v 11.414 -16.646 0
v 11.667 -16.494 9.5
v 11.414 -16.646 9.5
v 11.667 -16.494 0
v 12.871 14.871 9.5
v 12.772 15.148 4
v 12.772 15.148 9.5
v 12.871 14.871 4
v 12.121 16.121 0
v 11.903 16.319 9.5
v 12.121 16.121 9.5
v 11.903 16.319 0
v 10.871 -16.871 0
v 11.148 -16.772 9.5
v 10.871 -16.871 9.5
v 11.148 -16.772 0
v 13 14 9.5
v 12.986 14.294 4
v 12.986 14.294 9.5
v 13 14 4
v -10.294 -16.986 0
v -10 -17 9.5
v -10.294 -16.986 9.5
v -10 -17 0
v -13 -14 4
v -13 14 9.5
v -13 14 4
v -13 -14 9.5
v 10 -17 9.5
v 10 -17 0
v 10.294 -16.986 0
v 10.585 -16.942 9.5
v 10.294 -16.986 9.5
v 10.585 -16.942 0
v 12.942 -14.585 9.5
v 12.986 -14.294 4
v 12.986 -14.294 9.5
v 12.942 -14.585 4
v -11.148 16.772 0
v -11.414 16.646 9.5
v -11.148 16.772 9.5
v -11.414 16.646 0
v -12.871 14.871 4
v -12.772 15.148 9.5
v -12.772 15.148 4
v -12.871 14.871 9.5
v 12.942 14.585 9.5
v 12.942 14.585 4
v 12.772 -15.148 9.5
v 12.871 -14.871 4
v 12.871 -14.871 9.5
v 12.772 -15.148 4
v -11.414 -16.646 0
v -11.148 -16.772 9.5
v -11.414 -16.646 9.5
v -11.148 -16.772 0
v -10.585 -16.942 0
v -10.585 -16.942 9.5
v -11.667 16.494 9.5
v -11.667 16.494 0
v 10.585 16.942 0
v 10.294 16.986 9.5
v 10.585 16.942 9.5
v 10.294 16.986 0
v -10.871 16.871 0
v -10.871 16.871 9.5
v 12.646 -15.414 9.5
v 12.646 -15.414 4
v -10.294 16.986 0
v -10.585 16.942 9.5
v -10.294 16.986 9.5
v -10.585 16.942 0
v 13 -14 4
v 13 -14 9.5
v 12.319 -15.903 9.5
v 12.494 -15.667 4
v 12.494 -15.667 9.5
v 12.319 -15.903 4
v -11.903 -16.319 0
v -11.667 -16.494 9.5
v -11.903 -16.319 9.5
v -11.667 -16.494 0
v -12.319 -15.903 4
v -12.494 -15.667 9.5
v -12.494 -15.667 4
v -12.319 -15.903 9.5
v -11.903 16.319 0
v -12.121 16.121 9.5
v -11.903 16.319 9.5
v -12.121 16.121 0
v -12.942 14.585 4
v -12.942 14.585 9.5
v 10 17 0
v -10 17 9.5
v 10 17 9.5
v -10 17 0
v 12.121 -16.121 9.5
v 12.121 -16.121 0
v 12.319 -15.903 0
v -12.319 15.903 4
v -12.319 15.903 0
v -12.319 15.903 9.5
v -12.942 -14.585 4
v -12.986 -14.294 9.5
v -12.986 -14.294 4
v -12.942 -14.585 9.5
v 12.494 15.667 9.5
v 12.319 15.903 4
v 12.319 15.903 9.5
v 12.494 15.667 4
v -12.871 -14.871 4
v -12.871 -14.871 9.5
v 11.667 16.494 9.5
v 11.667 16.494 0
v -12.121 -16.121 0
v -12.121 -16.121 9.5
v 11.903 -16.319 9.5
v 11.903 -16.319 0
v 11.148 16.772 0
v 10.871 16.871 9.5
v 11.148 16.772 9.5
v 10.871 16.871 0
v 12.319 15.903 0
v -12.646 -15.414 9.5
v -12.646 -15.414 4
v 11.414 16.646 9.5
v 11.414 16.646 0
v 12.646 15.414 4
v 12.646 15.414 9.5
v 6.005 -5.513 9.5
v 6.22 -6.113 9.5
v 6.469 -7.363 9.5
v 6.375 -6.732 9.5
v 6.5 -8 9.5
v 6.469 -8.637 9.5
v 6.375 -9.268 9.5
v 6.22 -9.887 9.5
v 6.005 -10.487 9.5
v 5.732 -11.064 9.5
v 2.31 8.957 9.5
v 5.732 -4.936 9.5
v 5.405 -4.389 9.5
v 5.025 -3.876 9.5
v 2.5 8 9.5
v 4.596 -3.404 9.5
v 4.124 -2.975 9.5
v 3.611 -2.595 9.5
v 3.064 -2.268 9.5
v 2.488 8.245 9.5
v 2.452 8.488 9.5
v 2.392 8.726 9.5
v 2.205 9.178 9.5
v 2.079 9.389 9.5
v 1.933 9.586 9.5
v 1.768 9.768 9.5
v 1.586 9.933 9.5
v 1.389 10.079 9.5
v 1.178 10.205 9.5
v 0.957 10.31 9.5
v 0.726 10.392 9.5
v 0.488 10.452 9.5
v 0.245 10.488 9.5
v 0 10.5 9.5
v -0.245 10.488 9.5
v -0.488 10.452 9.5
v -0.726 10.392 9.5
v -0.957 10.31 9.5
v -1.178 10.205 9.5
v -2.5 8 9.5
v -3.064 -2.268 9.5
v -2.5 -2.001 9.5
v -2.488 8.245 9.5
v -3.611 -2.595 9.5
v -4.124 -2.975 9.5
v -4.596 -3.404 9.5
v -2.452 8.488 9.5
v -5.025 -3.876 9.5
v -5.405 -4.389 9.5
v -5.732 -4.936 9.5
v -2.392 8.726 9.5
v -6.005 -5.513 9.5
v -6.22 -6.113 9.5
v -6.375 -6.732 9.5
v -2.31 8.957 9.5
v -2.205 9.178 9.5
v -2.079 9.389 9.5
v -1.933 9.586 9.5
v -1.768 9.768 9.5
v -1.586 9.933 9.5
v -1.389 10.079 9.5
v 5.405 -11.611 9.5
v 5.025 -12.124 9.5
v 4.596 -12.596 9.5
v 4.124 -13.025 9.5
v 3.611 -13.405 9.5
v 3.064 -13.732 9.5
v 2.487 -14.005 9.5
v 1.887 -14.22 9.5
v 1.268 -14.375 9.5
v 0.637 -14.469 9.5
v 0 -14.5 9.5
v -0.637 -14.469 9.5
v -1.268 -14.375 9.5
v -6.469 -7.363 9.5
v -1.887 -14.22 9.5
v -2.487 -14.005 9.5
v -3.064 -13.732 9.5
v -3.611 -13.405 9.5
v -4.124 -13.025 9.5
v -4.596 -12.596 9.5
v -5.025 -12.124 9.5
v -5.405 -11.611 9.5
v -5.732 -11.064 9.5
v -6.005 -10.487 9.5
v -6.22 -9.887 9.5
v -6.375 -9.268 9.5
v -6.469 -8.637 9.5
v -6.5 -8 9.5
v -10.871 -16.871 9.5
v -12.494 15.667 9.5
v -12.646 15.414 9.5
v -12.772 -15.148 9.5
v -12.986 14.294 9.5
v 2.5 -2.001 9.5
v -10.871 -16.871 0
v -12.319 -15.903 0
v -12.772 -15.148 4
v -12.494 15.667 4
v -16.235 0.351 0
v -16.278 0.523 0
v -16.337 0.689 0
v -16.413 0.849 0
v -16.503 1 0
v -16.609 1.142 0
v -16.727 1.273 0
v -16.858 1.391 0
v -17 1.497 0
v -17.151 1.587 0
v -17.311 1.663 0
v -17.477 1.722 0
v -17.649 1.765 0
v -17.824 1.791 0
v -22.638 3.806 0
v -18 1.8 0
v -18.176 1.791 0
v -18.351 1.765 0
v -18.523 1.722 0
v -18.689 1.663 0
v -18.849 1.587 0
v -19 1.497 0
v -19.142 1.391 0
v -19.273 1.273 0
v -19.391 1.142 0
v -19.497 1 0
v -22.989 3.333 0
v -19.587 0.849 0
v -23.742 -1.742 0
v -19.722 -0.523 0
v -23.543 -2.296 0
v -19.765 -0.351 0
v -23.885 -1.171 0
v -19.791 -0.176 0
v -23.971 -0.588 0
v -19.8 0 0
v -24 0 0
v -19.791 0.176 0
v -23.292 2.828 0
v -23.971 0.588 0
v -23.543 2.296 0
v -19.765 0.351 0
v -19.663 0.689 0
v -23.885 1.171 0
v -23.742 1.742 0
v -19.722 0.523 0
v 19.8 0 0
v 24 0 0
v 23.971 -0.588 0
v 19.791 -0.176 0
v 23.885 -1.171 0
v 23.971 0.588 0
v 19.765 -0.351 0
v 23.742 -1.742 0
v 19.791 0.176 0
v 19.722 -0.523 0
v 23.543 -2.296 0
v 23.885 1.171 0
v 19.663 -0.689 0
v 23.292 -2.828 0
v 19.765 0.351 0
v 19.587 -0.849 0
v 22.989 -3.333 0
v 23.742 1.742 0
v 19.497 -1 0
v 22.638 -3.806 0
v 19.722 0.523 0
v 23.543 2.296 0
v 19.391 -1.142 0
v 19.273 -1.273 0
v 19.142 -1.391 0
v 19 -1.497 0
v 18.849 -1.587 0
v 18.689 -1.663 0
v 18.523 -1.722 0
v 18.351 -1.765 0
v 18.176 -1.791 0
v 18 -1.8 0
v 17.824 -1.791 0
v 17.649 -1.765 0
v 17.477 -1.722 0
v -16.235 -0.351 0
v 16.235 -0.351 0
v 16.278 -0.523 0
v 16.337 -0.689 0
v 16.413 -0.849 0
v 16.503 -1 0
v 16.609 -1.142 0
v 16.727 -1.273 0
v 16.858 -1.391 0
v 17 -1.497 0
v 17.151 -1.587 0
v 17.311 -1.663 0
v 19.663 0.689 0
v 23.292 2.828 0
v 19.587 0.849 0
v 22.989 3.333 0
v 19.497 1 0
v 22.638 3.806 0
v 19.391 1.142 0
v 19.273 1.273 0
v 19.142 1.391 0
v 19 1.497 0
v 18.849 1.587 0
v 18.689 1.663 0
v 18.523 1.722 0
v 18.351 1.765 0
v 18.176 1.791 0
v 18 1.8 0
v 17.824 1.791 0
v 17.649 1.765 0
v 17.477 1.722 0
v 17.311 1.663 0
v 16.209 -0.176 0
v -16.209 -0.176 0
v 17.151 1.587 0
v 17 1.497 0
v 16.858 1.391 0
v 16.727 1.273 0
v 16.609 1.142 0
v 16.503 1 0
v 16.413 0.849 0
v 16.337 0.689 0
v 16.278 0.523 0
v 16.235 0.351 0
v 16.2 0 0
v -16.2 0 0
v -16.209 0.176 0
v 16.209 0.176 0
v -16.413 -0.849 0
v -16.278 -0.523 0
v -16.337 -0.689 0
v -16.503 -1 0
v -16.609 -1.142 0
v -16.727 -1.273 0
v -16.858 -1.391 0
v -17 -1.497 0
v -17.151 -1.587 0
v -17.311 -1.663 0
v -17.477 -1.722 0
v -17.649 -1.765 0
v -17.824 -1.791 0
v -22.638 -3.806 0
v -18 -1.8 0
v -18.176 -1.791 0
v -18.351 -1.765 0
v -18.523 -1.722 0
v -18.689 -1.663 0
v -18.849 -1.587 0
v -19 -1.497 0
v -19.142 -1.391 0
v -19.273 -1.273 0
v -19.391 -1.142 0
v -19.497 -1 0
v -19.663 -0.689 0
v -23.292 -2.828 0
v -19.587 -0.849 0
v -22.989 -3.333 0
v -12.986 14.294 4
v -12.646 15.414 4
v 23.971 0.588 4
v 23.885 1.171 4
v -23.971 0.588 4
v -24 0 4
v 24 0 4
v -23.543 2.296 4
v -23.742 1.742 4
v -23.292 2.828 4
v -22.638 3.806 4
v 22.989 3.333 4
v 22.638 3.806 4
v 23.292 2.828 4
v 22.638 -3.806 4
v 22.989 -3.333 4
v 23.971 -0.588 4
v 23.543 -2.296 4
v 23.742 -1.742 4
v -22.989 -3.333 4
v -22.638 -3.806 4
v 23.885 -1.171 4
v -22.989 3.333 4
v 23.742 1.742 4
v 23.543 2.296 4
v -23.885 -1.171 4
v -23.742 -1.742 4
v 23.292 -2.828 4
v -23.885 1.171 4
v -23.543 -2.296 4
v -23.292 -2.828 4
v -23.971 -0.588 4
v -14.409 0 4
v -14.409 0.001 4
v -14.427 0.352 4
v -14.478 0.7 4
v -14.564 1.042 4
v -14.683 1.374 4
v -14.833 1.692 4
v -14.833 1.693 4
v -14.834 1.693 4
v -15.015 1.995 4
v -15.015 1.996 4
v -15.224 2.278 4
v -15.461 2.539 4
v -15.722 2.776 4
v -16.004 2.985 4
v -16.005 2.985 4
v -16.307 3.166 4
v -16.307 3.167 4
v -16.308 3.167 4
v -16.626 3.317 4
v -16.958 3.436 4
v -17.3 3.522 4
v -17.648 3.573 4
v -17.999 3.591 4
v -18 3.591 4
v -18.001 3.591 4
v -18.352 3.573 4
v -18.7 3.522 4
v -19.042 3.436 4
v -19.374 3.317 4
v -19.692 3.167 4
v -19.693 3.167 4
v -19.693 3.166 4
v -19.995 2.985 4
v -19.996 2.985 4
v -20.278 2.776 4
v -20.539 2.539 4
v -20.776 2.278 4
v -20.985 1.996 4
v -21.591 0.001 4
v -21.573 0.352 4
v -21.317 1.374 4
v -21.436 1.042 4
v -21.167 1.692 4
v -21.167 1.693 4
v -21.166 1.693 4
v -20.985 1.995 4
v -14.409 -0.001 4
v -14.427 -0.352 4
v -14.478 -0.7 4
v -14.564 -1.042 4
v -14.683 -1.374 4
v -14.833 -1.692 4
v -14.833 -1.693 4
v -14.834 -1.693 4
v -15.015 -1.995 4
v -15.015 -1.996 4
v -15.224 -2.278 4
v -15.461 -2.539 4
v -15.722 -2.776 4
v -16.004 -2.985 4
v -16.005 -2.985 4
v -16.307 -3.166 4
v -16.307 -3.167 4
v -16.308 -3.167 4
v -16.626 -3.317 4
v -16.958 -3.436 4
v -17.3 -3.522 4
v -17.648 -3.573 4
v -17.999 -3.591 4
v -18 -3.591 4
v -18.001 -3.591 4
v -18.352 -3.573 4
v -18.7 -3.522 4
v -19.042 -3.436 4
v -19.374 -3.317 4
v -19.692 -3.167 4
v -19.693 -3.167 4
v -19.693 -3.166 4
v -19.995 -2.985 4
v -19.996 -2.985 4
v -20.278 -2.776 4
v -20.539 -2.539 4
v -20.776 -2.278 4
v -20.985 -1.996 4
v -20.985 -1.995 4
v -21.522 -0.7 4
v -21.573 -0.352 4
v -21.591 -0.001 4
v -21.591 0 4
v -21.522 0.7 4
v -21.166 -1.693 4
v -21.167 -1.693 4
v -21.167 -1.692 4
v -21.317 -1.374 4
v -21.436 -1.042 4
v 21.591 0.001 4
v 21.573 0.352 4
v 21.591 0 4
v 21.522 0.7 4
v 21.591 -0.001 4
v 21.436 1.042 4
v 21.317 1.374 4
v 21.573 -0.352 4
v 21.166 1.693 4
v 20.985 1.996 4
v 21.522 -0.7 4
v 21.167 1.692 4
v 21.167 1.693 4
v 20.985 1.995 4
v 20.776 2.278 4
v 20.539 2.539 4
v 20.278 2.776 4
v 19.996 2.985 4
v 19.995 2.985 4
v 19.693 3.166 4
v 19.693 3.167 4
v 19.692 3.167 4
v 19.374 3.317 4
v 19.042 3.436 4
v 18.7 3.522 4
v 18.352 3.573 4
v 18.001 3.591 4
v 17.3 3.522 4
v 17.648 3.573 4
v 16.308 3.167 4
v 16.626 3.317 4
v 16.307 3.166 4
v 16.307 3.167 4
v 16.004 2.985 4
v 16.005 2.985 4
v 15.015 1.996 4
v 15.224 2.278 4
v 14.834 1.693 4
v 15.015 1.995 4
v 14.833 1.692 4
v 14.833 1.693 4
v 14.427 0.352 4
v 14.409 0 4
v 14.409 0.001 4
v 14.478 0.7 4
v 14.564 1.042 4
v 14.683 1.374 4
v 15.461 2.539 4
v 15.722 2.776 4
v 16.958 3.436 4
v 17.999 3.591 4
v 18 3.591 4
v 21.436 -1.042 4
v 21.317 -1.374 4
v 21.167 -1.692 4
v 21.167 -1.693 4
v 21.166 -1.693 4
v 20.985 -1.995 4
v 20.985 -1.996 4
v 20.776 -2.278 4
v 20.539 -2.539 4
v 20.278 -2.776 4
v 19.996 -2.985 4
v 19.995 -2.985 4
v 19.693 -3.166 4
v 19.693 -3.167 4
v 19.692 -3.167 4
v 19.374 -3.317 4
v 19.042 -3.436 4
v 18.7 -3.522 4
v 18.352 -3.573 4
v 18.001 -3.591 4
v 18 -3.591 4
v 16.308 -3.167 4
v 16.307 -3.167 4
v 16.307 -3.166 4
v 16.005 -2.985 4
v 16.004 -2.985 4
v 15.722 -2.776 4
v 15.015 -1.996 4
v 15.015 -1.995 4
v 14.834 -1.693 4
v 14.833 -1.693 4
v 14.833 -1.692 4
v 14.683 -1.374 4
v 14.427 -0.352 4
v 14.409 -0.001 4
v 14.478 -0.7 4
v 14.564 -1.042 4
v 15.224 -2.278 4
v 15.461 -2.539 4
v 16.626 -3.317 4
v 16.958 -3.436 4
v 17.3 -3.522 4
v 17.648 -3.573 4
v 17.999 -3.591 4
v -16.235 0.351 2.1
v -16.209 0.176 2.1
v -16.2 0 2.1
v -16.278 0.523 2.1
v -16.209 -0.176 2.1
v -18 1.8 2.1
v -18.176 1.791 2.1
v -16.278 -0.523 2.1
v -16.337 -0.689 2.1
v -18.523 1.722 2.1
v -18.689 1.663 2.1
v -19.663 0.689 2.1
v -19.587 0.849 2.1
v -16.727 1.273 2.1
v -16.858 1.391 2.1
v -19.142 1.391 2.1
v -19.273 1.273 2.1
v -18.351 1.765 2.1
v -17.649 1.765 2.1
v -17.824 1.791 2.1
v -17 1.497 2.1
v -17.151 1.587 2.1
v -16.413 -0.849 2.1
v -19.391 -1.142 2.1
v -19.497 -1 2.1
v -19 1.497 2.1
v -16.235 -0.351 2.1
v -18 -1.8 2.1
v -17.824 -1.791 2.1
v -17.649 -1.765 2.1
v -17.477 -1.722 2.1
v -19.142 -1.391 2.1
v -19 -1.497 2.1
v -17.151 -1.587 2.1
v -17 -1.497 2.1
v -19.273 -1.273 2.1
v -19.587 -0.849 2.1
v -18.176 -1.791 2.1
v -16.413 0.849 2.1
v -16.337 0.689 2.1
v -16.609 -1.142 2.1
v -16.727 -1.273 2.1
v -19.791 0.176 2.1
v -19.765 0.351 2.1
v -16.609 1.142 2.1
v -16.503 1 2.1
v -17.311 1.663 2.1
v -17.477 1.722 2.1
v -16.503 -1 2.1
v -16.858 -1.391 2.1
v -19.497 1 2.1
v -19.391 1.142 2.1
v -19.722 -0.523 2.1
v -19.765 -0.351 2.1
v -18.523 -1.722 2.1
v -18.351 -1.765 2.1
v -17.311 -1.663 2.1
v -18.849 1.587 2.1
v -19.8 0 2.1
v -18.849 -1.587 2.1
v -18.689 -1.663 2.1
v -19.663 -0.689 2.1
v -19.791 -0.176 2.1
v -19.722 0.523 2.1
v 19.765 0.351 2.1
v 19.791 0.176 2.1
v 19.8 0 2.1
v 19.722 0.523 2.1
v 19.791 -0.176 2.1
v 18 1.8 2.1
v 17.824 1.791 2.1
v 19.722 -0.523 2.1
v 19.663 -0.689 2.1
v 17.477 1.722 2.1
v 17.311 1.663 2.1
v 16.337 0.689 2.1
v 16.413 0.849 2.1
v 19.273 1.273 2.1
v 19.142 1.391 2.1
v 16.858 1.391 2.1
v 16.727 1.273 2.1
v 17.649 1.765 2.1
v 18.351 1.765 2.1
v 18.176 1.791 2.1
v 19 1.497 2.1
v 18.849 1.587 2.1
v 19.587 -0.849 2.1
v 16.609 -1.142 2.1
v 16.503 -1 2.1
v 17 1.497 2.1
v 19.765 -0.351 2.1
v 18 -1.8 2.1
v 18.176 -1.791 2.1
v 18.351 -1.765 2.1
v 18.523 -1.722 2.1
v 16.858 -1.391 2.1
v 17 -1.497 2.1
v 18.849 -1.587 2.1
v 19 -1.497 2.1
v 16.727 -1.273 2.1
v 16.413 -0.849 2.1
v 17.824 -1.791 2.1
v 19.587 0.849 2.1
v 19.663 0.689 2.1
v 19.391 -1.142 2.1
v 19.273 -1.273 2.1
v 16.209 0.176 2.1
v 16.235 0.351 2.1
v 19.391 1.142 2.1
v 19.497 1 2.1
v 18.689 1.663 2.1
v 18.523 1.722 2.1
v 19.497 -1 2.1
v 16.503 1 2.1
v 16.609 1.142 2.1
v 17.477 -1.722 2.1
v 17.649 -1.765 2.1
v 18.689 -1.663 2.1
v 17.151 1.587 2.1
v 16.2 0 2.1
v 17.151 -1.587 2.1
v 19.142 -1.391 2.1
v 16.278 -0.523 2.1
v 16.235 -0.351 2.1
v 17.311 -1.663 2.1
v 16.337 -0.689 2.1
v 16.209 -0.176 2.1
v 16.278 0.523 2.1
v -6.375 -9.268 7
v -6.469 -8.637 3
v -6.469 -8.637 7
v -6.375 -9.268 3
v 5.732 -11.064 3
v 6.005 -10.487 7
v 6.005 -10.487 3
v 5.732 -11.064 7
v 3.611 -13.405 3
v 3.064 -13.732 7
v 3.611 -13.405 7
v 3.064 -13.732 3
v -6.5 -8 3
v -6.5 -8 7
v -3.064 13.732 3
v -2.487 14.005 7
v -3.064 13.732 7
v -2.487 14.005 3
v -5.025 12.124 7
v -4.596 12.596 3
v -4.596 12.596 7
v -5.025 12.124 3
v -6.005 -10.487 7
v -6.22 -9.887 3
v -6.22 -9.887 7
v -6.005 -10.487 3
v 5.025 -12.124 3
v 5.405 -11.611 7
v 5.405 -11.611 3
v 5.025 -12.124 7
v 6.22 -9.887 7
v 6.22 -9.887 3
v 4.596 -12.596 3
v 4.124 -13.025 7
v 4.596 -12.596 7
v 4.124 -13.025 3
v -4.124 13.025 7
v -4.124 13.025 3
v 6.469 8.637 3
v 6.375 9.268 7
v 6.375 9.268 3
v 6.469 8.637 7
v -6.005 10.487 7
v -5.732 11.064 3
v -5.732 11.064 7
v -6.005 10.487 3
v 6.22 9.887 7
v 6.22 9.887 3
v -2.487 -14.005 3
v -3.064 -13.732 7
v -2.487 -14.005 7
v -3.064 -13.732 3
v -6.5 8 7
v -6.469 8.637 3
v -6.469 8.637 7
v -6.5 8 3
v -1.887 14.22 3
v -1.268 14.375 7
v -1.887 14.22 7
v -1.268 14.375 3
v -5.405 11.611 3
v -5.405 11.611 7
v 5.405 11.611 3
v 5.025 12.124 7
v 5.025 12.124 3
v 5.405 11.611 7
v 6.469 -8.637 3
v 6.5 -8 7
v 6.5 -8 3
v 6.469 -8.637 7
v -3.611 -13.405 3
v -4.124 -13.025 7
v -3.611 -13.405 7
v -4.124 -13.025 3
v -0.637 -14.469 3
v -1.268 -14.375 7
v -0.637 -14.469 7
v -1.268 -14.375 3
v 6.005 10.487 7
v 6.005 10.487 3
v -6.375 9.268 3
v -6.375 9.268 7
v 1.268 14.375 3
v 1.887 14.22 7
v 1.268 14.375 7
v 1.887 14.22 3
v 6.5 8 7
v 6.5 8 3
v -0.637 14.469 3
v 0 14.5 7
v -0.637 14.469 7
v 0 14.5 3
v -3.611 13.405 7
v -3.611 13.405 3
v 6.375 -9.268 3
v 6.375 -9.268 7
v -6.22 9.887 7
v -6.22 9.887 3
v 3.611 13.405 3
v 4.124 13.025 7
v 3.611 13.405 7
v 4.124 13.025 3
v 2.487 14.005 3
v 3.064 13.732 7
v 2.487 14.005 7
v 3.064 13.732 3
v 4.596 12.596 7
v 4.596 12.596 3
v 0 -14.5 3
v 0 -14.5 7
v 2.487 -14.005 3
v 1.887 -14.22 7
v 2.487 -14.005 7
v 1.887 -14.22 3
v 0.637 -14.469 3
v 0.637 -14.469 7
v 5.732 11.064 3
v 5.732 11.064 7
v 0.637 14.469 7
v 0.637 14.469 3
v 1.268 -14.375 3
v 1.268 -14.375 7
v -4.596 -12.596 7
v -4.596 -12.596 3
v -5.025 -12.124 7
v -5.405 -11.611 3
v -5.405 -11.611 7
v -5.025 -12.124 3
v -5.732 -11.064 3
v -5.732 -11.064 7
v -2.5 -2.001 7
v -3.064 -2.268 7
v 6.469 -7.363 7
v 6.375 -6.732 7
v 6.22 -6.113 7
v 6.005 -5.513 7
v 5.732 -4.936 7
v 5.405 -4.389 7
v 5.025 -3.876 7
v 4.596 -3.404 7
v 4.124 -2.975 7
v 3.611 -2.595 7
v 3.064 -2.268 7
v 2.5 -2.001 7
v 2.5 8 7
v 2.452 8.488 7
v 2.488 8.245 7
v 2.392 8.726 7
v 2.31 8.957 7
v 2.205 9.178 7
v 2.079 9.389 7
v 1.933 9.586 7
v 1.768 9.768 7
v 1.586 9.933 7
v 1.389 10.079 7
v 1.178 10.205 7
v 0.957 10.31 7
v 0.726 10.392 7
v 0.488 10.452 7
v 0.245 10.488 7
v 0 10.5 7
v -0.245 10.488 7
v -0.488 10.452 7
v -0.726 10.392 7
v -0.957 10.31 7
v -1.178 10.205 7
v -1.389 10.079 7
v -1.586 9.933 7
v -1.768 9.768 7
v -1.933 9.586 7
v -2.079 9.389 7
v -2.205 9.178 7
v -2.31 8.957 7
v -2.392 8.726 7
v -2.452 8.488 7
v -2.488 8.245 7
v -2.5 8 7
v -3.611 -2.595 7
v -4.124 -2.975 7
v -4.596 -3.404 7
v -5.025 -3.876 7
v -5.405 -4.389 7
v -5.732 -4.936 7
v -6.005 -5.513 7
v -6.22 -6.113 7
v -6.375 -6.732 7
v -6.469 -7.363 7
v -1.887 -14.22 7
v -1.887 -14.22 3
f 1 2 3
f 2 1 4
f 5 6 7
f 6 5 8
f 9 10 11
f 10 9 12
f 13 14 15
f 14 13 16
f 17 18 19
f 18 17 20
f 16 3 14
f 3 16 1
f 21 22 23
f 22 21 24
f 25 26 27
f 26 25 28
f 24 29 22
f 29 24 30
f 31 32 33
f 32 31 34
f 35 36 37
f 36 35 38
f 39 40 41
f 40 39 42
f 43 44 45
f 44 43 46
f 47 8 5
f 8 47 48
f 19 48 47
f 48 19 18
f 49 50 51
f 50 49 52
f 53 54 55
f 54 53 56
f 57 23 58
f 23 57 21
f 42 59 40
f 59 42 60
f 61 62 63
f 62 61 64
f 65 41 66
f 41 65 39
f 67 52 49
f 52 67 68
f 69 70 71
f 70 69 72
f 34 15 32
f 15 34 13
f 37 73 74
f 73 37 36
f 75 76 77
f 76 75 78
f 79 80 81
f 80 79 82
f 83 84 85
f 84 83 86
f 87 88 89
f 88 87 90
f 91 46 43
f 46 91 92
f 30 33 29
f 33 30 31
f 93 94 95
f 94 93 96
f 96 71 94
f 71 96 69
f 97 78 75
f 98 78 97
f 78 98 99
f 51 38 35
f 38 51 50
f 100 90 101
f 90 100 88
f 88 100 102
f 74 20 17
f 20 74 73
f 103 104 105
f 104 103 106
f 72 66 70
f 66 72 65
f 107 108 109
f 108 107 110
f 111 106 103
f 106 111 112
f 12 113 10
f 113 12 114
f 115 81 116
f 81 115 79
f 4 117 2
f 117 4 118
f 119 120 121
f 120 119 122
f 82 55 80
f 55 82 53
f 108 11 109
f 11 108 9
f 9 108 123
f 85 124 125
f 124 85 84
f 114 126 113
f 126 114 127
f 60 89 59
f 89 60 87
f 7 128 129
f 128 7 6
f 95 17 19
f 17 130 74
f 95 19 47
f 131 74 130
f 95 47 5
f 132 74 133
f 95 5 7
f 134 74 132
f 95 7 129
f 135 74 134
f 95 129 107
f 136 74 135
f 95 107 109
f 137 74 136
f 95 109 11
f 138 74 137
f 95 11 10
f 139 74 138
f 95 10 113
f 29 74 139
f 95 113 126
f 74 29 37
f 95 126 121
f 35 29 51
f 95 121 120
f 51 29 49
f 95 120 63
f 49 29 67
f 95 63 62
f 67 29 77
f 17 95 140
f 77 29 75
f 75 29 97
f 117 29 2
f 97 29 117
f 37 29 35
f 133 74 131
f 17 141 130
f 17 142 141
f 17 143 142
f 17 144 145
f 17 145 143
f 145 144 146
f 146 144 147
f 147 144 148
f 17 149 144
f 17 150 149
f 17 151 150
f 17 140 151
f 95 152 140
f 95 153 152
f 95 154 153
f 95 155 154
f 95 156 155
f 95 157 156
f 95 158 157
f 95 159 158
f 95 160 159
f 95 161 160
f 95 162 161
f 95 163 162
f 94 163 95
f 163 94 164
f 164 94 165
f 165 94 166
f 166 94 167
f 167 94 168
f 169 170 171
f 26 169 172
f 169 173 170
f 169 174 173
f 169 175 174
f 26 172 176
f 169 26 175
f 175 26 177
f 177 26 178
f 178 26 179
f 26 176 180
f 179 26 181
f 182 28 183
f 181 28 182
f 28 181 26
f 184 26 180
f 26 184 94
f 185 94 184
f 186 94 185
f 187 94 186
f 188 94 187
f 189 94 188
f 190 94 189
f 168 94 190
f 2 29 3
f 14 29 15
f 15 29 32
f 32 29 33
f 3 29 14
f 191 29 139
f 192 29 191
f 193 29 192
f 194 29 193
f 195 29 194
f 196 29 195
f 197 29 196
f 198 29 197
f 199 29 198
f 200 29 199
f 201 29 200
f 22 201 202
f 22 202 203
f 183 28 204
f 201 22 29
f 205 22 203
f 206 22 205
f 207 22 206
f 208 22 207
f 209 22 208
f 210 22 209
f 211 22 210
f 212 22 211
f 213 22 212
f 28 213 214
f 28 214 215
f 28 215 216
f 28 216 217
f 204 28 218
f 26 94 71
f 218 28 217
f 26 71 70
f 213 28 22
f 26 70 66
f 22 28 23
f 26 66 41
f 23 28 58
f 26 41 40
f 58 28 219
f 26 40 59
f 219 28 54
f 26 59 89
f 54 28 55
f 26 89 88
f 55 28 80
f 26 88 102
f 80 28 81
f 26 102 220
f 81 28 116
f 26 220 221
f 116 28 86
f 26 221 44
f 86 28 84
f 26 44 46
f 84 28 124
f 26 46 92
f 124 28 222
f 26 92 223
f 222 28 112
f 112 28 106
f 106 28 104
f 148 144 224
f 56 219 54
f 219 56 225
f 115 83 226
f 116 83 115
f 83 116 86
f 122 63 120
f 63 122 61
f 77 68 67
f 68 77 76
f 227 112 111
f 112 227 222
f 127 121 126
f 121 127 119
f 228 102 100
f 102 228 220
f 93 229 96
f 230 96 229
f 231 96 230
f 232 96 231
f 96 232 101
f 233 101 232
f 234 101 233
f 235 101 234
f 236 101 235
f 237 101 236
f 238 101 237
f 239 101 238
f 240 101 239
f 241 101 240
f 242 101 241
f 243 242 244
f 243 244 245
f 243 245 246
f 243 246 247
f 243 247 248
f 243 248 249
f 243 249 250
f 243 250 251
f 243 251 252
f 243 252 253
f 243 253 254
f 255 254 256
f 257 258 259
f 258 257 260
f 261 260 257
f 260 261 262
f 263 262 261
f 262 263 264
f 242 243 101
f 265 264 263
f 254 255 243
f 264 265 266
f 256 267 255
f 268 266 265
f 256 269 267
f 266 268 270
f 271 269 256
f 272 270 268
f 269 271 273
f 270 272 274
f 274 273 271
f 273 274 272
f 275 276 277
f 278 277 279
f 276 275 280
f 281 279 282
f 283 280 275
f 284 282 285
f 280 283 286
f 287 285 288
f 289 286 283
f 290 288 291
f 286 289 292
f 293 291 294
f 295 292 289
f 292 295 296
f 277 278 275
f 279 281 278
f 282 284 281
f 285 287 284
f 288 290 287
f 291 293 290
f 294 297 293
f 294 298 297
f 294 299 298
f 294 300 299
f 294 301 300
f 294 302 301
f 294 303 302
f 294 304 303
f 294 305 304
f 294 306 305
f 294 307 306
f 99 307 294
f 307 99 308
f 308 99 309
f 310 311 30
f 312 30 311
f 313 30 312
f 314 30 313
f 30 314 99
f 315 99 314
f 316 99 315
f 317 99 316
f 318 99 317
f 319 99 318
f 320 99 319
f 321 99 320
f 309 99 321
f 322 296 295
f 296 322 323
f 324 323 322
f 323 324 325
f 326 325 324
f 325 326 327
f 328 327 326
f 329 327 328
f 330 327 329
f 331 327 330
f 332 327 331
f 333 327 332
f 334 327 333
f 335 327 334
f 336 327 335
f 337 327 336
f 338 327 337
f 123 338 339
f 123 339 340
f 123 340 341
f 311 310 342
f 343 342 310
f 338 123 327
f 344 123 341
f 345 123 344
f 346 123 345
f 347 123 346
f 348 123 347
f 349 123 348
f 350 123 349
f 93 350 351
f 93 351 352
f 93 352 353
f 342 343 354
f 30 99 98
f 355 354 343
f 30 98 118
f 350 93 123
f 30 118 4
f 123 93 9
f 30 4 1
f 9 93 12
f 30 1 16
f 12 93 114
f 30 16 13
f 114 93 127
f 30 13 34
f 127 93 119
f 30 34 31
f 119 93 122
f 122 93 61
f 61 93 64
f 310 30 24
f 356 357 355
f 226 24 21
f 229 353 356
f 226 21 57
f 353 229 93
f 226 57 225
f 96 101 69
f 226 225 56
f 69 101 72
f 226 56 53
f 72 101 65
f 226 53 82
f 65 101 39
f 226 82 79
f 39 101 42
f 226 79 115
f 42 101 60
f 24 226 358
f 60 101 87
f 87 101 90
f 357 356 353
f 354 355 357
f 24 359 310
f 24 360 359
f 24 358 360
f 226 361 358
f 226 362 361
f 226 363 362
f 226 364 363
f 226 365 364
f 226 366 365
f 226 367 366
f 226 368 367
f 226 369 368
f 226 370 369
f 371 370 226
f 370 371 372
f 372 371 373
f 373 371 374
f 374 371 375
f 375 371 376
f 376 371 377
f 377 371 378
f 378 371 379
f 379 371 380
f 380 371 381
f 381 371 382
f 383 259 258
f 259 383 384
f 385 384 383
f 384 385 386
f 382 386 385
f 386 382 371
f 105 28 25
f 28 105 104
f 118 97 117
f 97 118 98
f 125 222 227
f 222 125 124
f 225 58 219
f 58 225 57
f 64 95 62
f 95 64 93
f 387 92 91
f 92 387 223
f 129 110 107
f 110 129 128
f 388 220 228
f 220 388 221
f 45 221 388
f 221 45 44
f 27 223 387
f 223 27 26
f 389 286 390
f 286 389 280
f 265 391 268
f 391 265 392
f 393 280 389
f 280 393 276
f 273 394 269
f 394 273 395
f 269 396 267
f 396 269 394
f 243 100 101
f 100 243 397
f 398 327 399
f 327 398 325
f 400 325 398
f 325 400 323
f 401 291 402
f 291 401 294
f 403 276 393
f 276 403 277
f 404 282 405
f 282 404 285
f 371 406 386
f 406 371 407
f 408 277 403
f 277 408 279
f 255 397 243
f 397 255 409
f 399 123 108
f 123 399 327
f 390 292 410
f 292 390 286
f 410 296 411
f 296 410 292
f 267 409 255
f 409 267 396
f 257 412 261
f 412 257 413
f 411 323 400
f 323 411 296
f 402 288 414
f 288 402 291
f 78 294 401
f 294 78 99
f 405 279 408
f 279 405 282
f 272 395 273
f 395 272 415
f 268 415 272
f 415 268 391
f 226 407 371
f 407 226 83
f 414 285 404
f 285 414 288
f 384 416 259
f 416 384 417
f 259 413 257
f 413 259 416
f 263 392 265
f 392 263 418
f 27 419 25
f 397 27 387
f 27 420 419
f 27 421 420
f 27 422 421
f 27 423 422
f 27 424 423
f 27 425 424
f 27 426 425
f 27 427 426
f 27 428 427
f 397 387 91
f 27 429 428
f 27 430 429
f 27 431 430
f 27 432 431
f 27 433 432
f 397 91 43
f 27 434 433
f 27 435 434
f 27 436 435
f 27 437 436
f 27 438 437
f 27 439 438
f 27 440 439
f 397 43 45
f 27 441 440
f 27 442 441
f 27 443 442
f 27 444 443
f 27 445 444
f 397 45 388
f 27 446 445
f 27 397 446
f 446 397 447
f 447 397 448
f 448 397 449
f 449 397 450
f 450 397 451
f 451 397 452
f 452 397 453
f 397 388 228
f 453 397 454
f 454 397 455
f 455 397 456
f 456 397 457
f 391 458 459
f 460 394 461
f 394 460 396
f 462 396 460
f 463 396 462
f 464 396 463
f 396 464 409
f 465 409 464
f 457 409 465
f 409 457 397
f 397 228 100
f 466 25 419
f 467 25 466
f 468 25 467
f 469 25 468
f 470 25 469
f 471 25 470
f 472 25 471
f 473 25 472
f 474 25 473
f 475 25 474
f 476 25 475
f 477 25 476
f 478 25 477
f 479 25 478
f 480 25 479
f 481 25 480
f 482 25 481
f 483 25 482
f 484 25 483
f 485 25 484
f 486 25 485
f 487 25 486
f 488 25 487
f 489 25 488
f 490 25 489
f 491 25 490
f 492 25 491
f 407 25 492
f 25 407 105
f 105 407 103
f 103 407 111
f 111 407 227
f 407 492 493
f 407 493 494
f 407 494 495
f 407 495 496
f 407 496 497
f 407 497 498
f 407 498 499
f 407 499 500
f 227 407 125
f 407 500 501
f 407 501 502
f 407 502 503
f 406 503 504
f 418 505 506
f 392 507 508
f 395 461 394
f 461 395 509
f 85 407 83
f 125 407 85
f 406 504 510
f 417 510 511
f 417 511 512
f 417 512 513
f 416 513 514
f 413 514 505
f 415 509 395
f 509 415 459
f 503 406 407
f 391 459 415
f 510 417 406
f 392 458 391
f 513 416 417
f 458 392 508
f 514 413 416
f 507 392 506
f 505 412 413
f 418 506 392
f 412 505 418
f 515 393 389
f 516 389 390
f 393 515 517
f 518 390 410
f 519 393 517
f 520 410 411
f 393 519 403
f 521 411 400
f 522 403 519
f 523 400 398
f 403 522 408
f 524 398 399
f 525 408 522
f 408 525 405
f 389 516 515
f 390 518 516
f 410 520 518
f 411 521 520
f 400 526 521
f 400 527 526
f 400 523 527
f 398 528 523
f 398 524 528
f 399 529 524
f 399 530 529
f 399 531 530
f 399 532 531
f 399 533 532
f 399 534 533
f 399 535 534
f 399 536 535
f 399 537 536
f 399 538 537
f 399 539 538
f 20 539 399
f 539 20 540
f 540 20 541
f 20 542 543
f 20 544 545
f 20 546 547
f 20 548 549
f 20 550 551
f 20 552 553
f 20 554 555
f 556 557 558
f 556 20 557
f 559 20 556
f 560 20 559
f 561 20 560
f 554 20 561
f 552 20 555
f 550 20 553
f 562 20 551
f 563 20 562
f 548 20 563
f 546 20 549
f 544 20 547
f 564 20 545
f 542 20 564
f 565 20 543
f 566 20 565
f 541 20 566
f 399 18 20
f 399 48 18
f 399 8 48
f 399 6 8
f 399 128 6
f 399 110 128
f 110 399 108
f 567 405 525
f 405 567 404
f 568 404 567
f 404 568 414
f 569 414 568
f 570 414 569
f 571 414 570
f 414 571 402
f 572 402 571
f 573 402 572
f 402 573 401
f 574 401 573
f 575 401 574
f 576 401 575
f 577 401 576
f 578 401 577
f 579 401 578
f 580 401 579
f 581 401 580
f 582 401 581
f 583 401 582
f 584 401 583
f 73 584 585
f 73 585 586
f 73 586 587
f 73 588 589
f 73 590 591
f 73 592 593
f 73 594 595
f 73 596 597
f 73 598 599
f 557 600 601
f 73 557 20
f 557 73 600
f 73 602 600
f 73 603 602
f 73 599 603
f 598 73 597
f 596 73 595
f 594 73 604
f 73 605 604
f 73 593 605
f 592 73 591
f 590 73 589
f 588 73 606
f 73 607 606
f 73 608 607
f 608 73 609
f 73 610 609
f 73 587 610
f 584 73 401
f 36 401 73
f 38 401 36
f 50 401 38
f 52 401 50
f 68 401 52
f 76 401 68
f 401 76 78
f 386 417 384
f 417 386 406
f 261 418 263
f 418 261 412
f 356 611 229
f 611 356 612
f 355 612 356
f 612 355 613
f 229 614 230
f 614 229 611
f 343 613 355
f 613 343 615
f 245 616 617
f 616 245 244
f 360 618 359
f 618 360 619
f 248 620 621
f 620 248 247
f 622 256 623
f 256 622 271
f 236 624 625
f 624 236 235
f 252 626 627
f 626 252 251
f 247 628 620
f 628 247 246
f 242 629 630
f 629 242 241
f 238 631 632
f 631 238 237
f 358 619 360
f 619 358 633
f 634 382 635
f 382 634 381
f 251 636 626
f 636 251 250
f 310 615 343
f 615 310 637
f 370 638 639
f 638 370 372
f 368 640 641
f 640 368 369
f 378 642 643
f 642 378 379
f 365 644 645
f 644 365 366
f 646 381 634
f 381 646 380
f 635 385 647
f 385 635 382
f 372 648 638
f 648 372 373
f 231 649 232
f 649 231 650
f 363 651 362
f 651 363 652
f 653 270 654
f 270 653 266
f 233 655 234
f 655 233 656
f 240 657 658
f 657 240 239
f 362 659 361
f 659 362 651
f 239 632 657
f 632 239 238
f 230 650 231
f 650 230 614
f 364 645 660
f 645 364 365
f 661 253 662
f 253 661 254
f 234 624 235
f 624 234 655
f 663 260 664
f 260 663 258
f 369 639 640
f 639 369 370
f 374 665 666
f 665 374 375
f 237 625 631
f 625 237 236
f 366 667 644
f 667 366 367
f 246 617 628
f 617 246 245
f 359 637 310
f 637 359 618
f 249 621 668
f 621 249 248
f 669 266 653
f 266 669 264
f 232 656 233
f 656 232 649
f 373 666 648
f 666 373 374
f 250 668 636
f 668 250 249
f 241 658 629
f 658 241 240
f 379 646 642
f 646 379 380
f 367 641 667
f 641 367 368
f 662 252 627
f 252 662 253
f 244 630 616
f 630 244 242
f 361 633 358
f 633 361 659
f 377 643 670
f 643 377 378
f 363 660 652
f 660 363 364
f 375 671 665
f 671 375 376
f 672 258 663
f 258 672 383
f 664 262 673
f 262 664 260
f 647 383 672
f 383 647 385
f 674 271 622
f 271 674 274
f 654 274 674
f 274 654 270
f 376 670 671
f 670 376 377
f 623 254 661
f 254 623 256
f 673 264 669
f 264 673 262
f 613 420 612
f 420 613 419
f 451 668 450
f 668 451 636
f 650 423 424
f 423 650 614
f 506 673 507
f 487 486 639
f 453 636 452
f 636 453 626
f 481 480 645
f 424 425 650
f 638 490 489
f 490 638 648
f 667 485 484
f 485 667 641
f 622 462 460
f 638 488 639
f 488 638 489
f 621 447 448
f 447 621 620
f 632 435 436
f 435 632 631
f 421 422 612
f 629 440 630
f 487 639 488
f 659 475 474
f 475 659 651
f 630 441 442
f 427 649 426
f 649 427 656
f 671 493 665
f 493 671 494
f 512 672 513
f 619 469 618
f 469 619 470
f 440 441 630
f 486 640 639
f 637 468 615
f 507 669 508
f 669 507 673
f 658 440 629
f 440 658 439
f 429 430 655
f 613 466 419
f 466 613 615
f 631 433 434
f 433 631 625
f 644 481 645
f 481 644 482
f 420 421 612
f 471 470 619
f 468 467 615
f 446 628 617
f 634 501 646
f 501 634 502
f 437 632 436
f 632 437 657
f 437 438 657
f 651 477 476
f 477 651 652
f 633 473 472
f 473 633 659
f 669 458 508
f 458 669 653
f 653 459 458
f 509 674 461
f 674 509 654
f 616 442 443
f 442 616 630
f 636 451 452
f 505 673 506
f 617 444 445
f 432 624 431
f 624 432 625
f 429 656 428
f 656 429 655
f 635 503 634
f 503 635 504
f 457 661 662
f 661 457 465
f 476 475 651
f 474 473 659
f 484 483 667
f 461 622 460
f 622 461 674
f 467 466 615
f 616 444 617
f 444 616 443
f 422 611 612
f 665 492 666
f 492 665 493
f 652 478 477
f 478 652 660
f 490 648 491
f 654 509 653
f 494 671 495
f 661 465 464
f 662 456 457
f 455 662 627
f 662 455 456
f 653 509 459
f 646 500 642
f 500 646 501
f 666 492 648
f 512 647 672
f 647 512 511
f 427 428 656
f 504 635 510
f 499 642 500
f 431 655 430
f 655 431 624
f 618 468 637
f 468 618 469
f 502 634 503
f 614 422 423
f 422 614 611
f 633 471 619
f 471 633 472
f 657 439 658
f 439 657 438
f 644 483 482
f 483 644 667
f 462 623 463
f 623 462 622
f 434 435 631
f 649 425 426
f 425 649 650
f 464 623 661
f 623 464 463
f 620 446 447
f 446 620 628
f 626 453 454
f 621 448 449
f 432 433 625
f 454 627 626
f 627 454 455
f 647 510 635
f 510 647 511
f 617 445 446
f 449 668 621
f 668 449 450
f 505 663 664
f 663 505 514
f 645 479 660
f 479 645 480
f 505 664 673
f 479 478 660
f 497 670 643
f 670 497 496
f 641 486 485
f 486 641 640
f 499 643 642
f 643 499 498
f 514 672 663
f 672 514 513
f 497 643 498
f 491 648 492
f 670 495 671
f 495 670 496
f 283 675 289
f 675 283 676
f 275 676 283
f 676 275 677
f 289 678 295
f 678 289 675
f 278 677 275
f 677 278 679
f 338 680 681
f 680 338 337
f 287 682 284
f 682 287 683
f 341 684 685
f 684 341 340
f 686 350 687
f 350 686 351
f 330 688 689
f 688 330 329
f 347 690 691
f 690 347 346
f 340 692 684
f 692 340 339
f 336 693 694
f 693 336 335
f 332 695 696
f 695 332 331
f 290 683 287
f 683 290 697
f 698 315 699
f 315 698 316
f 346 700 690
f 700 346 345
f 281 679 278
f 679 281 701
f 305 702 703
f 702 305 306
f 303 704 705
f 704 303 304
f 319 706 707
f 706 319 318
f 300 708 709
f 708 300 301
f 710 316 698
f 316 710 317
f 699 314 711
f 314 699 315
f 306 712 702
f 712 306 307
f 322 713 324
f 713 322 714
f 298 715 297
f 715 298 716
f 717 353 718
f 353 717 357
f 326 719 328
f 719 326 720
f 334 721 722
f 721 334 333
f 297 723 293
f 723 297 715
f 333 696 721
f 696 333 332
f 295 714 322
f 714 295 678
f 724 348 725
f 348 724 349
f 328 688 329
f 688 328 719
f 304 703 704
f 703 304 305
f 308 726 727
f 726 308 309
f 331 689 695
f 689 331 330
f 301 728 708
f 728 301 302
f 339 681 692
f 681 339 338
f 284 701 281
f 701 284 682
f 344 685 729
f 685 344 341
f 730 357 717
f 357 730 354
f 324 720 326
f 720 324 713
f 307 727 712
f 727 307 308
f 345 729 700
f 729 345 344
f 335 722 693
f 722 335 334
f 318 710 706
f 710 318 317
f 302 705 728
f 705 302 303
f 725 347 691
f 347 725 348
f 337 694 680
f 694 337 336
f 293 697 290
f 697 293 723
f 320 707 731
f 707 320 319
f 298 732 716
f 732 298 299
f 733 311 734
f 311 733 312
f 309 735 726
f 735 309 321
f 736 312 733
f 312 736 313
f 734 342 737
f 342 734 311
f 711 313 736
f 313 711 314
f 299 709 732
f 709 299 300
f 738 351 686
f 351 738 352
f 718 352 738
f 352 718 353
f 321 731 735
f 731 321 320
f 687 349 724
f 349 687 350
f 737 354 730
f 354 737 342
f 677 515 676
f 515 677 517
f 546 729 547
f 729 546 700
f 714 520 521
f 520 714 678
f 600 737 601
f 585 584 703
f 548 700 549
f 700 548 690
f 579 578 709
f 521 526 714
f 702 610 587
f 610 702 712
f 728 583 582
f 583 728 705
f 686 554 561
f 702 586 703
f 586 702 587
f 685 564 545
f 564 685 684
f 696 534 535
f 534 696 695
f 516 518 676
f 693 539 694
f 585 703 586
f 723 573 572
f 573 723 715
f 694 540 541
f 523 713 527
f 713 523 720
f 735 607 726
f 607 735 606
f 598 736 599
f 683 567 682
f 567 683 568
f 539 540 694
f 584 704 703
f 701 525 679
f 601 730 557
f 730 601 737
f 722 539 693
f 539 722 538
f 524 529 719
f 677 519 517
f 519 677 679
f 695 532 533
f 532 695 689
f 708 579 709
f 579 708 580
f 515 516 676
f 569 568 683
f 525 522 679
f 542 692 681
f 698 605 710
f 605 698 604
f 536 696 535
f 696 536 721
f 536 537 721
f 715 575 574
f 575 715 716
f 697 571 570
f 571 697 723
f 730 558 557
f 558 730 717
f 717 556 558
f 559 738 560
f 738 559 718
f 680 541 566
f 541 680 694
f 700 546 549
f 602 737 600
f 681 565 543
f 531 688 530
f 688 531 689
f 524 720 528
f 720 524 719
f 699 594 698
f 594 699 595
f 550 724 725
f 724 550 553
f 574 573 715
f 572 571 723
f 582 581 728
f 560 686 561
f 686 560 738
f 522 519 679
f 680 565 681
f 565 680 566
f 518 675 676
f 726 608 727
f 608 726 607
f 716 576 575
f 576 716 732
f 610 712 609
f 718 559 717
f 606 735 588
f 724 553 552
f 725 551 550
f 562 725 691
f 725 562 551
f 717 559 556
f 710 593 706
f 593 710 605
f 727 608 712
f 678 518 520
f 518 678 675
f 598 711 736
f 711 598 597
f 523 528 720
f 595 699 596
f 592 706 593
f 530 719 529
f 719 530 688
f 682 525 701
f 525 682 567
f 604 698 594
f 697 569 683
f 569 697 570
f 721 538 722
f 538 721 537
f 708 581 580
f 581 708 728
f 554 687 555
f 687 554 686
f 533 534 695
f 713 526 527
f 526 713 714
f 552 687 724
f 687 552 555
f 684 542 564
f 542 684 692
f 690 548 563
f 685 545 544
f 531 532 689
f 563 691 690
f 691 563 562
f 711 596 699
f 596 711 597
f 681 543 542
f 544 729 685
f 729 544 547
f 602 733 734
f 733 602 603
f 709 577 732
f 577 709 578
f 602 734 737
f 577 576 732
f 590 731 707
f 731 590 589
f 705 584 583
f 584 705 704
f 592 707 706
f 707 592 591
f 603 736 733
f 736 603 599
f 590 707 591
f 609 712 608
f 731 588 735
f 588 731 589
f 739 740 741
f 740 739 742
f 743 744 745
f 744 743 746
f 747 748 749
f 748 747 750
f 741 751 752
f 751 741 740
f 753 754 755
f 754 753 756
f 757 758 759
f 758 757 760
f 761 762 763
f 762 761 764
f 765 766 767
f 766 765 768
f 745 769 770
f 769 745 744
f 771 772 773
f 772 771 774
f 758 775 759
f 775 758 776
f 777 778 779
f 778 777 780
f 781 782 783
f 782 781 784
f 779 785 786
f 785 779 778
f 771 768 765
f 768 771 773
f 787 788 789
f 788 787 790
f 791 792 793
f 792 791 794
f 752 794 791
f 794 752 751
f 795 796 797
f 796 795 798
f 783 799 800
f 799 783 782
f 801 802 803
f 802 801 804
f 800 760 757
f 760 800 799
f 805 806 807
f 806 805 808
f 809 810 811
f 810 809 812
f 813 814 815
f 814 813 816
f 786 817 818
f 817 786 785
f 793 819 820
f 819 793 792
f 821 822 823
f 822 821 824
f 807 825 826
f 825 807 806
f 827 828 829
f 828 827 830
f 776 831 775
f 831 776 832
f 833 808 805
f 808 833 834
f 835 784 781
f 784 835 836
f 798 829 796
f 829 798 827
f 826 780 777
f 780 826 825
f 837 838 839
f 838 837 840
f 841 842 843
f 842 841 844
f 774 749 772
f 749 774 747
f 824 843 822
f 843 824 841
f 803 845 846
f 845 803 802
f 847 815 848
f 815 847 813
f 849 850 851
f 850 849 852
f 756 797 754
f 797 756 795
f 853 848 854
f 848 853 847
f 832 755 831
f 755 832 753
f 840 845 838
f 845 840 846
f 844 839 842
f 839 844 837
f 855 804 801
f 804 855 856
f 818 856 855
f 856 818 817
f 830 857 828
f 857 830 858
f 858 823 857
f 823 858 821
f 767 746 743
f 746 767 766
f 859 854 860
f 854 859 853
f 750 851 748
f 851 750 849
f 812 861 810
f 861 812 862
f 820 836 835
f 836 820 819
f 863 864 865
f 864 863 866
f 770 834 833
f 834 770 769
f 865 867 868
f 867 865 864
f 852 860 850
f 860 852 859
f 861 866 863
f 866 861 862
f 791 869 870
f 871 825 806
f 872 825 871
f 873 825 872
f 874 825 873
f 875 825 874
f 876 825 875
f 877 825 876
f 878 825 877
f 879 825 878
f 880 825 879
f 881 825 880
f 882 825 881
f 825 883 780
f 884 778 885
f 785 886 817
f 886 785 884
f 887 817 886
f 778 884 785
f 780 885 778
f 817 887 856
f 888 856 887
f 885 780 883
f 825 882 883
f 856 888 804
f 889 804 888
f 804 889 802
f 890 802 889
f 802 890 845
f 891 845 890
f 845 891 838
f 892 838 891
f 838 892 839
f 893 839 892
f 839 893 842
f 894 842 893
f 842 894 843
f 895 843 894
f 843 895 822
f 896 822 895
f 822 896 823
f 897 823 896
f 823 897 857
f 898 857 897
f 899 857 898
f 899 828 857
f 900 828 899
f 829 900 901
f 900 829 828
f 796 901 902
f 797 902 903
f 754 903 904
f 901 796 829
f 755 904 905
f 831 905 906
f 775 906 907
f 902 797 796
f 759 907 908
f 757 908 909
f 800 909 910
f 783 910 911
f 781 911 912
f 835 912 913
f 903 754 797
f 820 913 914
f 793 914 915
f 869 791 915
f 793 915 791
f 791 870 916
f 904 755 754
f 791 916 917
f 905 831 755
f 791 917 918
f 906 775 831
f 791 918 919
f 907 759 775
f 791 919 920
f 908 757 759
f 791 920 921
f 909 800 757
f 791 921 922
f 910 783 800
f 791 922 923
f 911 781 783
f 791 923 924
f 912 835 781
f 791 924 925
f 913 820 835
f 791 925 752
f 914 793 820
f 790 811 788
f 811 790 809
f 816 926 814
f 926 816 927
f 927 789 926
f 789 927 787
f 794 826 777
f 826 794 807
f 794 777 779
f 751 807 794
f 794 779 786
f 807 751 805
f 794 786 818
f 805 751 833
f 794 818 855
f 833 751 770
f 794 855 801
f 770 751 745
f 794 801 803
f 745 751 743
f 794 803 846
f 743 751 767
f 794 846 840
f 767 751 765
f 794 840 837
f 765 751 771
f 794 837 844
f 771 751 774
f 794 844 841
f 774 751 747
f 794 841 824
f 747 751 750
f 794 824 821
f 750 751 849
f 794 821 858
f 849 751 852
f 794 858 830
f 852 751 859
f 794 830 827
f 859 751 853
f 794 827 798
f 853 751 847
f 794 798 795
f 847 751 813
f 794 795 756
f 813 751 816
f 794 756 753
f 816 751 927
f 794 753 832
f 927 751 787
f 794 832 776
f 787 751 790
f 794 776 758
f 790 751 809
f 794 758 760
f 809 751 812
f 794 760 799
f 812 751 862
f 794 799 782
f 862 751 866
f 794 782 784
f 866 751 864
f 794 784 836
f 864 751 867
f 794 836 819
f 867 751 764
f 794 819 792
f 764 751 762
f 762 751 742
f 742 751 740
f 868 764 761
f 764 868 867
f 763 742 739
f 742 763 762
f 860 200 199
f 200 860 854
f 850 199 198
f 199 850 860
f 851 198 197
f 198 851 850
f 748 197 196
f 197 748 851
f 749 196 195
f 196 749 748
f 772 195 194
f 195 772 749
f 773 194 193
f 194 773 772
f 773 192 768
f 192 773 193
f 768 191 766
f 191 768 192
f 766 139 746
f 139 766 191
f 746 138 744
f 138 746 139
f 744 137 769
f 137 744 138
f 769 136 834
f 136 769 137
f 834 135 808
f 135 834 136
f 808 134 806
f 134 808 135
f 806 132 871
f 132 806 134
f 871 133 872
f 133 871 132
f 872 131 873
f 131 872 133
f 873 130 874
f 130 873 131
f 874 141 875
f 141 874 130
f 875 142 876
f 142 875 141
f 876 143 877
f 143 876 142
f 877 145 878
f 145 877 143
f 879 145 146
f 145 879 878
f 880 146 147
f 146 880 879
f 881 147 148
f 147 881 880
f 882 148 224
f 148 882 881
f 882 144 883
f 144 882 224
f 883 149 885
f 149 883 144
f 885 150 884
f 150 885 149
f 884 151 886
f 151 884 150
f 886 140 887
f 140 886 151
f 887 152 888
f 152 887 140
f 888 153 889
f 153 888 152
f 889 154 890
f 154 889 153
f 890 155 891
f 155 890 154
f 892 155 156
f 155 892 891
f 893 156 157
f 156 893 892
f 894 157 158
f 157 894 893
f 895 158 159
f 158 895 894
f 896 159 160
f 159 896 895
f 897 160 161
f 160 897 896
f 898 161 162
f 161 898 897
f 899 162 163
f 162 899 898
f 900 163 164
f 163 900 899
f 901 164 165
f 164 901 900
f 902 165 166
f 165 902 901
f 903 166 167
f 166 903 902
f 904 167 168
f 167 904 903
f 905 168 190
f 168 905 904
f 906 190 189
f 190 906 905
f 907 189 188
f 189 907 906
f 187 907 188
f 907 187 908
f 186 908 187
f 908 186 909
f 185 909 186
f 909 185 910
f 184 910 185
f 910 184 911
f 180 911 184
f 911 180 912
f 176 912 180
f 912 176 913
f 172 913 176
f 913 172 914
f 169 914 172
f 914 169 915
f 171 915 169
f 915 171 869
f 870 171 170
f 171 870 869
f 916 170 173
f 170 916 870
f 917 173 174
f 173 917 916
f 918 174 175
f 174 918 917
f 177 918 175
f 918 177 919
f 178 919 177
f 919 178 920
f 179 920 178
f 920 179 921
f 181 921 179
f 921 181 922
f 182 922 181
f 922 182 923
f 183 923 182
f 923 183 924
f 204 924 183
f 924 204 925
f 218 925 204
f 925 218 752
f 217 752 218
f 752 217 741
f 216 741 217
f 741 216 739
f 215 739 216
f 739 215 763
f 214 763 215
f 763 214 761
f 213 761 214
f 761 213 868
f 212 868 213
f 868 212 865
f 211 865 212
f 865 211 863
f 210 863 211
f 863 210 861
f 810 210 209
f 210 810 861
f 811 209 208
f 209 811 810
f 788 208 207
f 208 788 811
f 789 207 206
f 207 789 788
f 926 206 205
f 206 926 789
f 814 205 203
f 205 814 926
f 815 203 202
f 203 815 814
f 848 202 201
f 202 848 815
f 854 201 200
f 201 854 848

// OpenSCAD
// file: keyhole_hanger_002.scad
// keyhole_hanger_002.scad
// Two-part wall hanger set for a wooden board.
//
//   Part A - keyhole plate. Carries the load, sets the height,
//            traps the nail head so the board can't be pulled off.
//   Part B - stabilizer plate. Open channel, no retaining lip.
//            Stops the board rotating around A's nail and holds that
//            end flat to the wall. Deliberately forgiving: the nail can
//            sit anywhere in a wide window, so it never fights part A.
//
// Both parts are the same total thickness, so the board sits flat.
//
// Orientation when installed:
//   z = 0        flat face, screwed against the board
//   z = total_t  face toward the wall

$fn = 64;
eps = 0.01;

// "A", "B", or "both" (both = side by side, for preview only)
part = "both";

/* ---- shared stack ---- */
web_t = 3.0;      // solid layer against the wood
cav_t = 4.0;      // nail-head clearance
lip_t = 2.5;      // retaining lip / channel mouth
total_t = web_t + cav_t + lip_t;   // 9.5

corner_r = 3;

/* ---- shared mounting ears ---- */
ear_r      = 6;
ear_t      = 4.0;
screw_d    = 3.6;            // #6 wood screw shank
csink_d    = 7.2;
csink_deep = 1.9;

/* ---- part A: keyhole ---- */
a_body_w = 26;
a_body_h = 34;
a_ear_cx = a_body_w/2 + 5;   // 18
head_d   = 13.0;             // clearance dia for the nail head
shank_w  =  5.0;             // slot width (nail shank + clearance)
hole_y   = -8;               // centre of the big entry opening
slot_y   =  8;               // top of slot = where the nail carries the load

/* ---- part B: stabilizer ---- */
b_body_w  = 36;
b_body_h  = 26;
b_ear_cx  = b_body_w/2 + 5;  // 23
chan_w    = 26;              // lateral tolerance for the second nail
chan_h    = 14;              // vertical tolerance (never load-bearing)

/* ---------------- shared helpers ---------------- */

module rrect2d(w, h, r) {
    offset(r = r) square([w - 2*r, h - 2*r], center = true);
}

module foot2d(body_w, body_h, ear_cx) {
    hull() {
        rrect2d(body_w, body_h, corner_r);
        for (s = [-1, 1]) translate([s * ear_cx, 0]) circle(r = ear_r);
    }
}

// body + ears, before any openings are cut
module blank(body_w, body_h, ear_cx) {
    union() {
        linear_extrude(total_t) rrect2d(body_w, body_h, corner_r);
        linear_extrude(ear_t)   foot2d(body_w, body_h, ear_cx);
    }
}

// countersunk screw holes, heads on the wall-facing side of the ears
module screws(ear_cx) {
    for (s = [-1, 1]) translate([s * ear_cx, 0, 0]) {
        translate([0, 0, -eps])
            cylinder(d = screw_d, h = ear_t + 2*eps);
        translate([0, 0, ear_t - csink_deep])
            cylinder(d1 = screw_d, d2 = csink_d, h = csink_deep + eps);
    }
}

/* ---------------- part A: keyhole plate ---------------- */

// cavity the nail head slides through, behind the lip
module a_cavity2d() {
    hull() {
        translate([0, hole_y]) circle(d = head_d);
        translate([0, slot_y]) circle(d = head_d);
    }
}

// opening cut through the lip: full-size entry hole + narrow slot above it
module a_opening2d() {
    translate([0, hole_y]) circle(d = head_d);
    hull() {
        translate([0, hole_y]) circle(d = shank_w);
        translate([0, slot_y]) circle(d = shank_w);
    }
}

module part_A() {
    difference() {
        blank(a_body_w, a_body_h, a_ear_cx);

        // nail-head cavity (sealed except through the lip opening)
        translate([0, 0, web_t])
            linear_extrude(cav_t) a_cavity2d();

        // keyhole through the lip
        translate([0, 0, web_t + cav_t - eps])
            linear_extrude(lip_t + 2*eps) a_opening2d();

        screws(a_ear_cx);
    }
}

/* ---------------- part B: stabilizer plate ---------------- */

module b_channel2d() {
    r = chan_h / 2;
    hull()
        for (s = [-1, 1]) translate([s * (chan_w/2 - r), 0]) circle(r = r);
}

module part_B() {
    difference() {
        blank(b_body_w, b_body_h, b_ear_cx);

        // open channel straight through cavity + lip, floored by the web
        translate([0, 0, web_t])
            linear_extrude(cav_t + lip_t + eps) b_channel2d();

        screws(b_ear_cx);
    }
}

/* ---------------- output ---------------- */

if (part == "A")    part_A();
else if (part == "B") part_B();
else {
    translate([-28, 0, 0]) part_A();
    translate([ 34, 0, 0]) part_B();
}
// main file
// Print wrapper: part A (keyhole plate) from keyhole_hanger_002.scad
use <keyhole_hanger_002.scad>
part_A();
